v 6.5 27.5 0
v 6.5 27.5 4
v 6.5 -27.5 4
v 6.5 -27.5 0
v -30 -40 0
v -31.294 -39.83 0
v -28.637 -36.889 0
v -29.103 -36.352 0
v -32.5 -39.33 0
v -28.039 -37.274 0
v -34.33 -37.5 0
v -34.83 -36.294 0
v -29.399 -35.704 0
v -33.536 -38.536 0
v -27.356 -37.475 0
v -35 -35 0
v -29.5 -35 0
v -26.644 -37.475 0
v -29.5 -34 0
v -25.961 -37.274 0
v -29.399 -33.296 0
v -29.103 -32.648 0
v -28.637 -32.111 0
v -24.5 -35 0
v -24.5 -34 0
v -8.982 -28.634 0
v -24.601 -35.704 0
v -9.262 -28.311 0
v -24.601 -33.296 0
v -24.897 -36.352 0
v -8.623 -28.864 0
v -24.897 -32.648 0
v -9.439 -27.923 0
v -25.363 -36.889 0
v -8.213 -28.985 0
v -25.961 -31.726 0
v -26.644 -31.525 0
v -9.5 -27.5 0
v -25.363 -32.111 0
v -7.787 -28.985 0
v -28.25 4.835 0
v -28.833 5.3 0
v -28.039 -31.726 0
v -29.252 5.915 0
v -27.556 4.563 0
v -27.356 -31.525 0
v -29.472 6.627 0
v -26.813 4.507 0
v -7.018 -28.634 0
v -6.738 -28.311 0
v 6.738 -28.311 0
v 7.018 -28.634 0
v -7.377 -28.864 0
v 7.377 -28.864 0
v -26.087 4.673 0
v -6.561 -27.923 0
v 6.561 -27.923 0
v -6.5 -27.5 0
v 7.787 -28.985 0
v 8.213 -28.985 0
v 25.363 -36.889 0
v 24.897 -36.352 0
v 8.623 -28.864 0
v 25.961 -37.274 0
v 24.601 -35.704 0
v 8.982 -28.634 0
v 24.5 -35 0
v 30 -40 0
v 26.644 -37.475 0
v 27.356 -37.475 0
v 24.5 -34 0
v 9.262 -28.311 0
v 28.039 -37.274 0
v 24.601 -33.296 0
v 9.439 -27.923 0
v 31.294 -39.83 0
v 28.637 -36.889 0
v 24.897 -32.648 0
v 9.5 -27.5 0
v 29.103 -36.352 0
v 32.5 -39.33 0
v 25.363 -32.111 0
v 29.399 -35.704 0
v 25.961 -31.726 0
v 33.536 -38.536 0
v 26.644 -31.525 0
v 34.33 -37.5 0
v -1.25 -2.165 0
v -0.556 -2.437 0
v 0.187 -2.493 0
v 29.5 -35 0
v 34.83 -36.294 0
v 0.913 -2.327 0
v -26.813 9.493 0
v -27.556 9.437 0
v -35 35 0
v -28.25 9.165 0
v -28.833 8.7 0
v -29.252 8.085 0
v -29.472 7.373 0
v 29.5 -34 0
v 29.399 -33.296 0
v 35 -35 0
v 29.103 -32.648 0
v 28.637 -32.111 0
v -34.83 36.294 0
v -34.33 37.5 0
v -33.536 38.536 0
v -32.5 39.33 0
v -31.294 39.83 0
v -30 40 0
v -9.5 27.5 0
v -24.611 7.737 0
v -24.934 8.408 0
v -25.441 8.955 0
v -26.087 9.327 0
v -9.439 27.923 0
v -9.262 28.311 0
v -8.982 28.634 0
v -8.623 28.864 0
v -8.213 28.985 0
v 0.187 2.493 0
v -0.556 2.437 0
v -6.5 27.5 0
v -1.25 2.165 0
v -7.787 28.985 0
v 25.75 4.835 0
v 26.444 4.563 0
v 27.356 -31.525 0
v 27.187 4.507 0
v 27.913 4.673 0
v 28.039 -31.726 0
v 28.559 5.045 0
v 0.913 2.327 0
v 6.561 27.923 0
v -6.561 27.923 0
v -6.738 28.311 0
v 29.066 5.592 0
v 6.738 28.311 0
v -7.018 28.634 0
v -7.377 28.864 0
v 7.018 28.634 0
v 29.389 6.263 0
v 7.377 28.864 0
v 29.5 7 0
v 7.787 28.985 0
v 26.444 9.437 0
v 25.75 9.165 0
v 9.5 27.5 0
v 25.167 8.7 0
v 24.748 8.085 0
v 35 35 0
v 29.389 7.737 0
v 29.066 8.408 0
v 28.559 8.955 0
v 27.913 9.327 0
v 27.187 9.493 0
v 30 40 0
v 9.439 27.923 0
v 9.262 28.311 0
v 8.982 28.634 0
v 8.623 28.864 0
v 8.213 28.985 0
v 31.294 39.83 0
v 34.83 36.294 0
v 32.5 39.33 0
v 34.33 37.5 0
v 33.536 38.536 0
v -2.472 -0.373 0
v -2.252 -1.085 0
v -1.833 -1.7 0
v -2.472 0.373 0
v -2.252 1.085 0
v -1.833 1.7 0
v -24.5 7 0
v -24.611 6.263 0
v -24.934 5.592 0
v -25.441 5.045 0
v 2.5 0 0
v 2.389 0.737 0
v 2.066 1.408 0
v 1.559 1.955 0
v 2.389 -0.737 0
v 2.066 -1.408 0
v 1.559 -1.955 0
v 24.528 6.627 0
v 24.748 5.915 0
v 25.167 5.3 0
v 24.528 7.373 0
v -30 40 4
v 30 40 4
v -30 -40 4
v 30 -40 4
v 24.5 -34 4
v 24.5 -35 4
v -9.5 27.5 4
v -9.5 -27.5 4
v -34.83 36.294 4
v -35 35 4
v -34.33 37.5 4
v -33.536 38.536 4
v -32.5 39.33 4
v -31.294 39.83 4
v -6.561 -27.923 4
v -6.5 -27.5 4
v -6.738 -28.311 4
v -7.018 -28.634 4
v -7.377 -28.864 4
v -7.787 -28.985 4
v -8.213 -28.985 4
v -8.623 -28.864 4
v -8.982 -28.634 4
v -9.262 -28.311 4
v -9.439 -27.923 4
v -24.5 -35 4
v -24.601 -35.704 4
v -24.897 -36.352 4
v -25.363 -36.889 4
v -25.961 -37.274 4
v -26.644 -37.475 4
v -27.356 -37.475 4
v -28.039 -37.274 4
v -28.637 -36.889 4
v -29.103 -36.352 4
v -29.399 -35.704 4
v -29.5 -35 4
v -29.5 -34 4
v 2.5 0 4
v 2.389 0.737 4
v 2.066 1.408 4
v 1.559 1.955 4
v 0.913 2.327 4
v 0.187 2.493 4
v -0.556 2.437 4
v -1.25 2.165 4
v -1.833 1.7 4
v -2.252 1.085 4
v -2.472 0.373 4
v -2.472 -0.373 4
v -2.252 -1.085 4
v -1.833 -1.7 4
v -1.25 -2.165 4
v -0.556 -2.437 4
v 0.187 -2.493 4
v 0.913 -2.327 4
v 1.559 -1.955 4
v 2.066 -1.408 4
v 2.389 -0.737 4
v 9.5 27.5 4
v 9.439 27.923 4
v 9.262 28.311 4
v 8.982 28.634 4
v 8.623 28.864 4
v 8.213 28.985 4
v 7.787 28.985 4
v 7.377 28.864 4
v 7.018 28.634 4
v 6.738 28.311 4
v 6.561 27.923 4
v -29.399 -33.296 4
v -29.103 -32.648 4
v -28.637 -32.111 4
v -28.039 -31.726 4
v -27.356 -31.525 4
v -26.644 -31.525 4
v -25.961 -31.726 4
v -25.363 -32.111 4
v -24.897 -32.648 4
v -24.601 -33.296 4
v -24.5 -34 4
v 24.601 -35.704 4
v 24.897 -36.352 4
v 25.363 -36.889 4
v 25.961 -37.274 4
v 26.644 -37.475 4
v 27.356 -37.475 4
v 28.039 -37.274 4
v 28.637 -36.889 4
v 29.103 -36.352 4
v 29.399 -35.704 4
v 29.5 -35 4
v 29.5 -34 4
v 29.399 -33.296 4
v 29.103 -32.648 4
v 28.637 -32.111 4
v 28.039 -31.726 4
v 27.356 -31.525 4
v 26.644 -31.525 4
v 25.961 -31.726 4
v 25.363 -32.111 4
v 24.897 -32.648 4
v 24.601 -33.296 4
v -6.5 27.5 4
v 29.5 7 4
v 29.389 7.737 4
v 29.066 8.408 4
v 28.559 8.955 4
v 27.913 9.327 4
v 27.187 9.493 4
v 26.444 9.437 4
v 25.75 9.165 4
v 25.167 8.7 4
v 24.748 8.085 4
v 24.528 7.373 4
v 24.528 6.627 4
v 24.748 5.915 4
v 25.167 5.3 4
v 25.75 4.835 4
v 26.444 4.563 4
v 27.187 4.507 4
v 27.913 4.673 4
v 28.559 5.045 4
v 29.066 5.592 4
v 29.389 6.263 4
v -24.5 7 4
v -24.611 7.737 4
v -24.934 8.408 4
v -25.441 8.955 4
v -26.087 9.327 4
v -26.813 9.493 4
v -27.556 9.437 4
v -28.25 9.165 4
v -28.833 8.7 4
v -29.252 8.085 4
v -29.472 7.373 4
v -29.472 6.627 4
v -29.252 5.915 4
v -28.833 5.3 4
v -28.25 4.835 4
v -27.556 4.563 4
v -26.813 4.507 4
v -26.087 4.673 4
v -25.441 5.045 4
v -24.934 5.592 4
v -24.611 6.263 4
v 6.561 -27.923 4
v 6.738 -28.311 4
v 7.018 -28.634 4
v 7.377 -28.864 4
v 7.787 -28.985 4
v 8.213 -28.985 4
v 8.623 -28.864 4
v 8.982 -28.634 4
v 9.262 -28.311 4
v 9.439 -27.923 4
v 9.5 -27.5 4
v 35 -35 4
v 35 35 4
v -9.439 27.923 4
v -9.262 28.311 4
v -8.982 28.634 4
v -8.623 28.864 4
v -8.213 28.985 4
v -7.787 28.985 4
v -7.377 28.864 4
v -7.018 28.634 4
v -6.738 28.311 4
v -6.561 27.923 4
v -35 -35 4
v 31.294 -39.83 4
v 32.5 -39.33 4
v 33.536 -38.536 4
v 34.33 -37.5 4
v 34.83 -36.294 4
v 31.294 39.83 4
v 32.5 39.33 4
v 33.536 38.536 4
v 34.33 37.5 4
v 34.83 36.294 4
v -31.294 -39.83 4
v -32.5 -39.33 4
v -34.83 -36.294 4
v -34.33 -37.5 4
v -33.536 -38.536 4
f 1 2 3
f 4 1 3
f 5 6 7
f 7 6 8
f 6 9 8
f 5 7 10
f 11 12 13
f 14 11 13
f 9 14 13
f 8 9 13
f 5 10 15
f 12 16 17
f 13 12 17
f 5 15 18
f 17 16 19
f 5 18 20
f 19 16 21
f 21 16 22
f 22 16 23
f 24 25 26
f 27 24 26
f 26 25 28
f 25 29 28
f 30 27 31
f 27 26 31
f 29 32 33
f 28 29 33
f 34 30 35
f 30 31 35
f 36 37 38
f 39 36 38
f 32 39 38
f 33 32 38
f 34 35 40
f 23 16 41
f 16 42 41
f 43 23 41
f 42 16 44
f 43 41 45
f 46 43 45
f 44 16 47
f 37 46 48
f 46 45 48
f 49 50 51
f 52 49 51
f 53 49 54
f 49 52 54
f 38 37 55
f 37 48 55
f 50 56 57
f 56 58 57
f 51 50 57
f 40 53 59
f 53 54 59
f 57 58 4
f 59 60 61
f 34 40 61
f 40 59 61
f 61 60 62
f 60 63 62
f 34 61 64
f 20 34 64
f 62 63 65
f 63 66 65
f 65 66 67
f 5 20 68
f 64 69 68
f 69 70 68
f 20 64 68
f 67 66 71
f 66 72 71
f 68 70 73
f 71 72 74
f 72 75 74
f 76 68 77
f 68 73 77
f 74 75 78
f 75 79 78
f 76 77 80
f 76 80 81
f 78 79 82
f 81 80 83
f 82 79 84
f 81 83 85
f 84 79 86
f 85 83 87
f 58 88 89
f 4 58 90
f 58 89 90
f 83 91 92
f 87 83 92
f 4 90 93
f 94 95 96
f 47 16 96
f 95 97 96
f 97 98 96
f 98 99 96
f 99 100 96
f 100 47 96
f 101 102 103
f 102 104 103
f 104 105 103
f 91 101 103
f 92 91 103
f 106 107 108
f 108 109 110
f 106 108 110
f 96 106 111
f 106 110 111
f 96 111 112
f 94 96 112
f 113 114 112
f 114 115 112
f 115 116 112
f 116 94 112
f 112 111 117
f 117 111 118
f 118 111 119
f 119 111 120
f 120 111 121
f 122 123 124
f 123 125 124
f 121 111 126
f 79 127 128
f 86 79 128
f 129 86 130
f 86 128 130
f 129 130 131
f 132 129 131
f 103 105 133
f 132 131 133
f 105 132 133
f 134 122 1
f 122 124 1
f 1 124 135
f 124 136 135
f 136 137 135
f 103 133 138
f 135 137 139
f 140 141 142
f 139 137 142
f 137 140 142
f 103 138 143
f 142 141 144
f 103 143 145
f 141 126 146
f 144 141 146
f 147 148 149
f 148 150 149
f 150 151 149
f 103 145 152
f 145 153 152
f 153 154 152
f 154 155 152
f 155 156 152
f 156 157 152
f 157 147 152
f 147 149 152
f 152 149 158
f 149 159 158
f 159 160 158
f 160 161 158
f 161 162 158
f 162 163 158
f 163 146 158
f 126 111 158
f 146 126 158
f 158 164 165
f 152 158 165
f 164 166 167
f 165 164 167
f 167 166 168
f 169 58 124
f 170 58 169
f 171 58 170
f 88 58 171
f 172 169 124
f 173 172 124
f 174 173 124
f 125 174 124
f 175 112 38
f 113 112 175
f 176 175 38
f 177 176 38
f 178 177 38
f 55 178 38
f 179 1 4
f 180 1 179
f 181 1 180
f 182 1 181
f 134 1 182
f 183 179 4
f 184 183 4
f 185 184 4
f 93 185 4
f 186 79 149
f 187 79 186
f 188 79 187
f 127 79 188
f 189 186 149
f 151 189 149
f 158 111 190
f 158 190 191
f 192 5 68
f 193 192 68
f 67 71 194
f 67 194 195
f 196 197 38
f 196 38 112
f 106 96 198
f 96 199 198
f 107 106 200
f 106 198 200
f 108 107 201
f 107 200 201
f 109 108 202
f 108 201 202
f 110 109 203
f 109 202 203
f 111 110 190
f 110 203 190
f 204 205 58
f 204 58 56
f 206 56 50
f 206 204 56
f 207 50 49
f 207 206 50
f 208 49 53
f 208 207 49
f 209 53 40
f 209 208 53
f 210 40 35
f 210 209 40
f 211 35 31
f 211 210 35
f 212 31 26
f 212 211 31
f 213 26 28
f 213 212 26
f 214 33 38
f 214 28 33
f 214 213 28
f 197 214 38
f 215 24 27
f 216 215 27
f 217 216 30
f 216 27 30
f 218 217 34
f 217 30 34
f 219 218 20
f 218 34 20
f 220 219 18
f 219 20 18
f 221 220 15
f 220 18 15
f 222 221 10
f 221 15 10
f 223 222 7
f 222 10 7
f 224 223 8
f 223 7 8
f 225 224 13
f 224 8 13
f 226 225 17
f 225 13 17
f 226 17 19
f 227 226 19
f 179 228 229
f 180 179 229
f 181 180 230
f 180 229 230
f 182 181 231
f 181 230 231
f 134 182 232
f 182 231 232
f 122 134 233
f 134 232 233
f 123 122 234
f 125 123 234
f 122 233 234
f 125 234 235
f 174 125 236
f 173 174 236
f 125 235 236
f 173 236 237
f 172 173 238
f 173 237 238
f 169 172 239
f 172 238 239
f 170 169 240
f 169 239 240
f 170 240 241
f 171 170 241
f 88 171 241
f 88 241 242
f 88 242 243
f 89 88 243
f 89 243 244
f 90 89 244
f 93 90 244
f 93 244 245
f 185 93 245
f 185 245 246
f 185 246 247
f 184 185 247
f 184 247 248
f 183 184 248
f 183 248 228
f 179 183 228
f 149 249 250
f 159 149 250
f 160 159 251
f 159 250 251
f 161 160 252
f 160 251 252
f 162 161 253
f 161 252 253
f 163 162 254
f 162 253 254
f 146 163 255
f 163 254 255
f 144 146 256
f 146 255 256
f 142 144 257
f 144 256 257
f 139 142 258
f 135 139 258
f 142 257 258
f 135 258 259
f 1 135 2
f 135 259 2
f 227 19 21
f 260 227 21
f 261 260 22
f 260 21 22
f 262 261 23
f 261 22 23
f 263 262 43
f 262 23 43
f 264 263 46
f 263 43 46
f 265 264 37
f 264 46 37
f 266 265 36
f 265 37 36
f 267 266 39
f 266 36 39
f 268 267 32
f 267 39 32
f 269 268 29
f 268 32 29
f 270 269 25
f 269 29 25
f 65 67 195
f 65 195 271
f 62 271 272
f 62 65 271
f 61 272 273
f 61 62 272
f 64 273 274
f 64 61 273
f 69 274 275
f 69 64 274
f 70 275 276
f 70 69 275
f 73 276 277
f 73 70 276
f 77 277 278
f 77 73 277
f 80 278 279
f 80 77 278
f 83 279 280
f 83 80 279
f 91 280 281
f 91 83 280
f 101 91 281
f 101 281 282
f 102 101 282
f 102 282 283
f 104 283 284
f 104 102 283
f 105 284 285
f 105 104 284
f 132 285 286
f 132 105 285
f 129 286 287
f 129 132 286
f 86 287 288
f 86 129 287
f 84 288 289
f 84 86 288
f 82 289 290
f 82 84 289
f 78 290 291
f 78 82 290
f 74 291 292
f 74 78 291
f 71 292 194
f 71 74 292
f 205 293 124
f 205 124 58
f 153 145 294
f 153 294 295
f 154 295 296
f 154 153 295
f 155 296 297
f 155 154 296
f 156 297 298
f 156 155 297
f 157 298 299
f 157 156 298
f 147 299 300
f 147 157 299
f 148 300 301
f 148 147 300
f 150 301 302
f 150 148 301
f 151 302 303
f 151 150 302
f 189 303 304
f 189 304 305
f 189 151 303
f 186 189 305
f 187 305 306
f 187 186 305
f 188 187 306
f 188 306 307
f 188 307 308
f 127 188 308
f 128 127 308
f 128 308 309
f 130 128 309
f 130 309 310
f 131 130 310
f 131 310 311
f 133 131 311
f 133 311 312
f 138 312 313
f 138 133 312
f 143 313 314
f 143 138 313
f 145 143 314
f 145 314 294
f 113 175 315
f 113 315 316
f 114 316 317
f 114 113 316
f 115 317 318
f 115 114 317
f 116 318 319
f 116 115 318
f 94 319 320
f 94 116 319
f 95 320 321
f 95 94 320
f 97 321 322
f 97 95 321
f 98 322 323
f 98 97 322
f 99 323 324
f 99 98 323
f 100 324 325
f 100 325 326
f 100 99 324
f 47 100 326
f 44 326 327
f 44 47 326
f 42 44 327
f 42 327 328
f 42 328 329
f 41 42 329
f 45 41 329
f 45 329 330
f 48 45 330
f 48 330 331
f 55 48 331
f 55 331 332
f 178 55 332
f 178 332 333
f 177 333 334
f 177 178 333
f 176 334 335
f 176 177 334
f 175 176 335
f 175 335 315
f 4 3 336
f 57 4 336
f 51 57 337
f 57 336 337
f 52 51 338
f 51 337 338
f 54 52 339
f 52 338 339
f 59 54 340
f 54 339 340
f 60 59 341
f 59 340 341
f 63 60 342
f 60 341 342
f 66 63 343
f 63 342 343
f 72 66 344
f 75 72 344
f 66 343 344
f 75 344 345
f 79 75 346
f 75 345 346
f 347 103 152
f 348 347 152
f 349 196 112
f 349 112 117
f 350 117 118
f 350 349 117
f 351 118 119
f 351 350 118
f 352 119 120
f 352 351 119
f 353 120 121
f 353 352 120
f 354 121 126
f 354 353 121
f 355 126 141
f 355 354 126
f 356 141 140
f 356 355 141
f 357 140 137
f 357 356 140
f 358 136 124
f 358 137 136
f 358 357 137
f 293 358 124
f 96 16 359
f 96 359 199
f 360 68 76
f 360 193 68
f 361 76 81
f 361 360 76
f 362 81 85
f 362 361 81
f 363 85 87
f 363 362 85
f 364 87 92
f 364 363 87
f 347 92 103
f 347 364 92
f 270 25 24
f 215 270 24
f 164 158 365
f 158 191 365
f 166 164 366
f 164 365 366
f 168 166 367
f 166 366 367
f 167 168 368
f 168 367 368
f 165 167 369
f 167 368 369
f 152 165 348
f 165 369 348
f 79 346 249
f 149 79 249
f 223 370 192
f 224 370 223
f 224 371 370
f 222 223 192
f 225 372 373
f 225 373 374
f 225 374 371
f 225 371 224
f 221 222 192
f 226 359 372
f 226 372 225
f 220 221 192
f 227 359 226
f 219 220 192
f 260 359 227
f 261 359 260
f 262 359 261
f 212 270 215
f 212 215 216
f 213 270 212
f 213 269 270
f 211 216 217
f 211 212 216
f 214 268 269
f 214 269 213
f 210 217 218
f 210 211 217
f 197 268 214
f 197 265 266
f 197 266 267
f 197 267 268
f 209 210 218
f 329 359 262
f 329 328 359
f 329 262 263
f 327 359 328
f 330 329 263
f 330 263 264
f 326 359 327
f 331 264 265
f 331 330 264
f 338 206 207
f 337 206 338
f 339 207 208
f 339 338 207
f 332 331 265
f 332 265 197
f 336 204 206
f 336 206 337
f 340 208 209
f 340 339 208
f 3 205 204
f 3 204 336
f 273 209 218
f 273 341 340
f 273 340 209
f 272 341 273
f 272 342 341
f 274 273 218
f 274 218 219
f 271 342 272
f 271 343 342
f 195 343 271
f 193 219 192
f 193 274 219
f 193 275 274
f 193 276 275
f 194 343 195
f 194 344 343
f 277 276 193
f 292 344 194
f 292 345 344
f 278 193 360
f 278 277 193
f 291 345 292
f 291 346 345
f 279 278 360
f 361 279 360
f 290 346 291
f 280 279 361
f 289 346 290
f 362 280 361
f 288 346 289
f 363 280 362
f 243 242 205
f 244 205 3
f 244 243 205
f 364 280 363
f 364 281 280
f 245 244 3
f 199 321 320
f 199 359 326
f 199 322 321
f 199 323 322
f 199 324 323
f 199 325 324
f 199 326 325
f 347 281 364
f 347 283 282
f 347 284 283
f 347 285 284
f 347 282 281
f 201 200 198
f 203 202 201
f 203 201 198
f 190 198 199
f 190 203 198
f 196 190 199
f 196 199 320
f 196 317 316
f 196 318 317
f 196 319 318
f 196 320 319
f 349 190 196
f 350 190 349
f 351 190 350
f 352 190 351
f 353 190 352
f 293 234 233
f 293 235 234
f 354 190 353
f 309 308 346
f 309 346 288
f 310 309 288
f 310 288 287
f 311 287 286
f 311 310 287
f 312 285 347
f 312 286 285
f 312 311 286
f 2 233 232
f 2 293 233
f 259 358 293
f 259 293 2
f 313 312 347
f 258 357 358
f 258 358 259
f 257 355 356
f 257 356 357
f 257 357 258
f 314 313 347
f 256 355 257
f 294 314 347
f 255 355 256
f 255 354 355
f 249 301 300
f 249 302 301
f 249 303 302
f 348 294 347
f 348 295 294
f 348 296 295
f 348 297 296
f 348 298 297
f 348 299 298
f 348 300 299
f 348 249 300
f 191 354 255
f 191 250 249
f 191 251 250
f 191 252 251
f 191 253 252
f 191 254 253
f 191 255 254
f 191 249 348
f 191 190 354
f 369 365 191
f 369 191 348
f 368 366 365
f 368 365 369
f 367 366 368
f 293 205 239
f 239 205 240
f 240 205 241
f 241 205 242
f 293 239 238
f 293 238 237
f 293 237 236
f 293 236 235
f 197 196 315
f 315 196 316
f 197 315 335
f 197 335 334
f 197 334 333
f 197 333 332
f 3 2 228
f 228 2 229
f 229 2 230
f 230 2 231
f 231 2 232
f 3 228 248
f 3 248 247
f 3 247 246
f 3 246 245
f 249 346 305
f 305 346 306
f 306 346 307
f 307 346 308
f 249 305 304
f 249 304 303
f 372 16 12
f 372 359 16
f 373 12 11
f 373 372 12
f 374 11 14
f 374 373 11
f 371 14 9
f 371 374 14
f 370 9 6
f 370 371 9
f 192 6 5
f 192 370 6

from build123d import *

# Parameters (mm, degrees)
SKETCH4_W           = 70
SKETCH4_H           = 80
SKETCH4_R           = 2.5
BOSS_EXTRUDE2_DEPTH = 4
FILLET1_R           = 5
SKETCH6_R           = 2.5
CUT_EXTRUDE1_DEPTH  = 5


with BuildPart() as part:
    # Sketch4 → Boss-Extrude2 (new body)
    with BuildSketch(Plane.XY):
        Rectangle(SKETCH4_W, SKETCH4_H)
        with Locations((-27, 7)):
            Circle(SKETCH4_R, mode=Mode.SUBTRACT)
        with Locations((27, 7)):
            Circle(SKETCH4_R, mode=Mode.SUBTRACT)
        with BuildLine():
            Line((-24.5, -34), (-24.5, -35))
            ThreePointArc((-24.5, -35), (-27, -37.5), (-29.5, -35))
            Line((-29.5, -35), (-29.5, -34))
            ThreePointArc((-29.5, -34), (-27, -31.5), (-24.5, -34))
        make_face(mode=Mode.SUBTRACT)
        with BuildLine():
            Line((24.5, -34), (24.5, -35))
            ThreePointArc((24.5, -35), (27, -37.5), (29.5, -35))
            Line((29.5, -35), (29.5, -34))
            ThreePointArc((29.5, -34), (27, -31.5), (24.5, -34))
        make_face(mode=Mode.SUBTRACT)
    extrude(amount=BOSS_EXTRUDE2_DEPTH)

    # Fillet1
    fillet1_edges = [part.edges().sort_by_distance(p)[0] for p in [
        (35, -40, 2),
        (-35, -40, 2),
        (-35, 40, 2),
        (35, 40, 2),
    ]]
    fillet(fillet1_edges, radius=FILLET1_R)

    # Sketch6 → Cut-Extrude1 (cut, through all)
    with BuildSketch(Plane.XY.offset(4)):
        Circle(SKETCH6_R)
        with BuildLine():
            Line((-6.5, 27.5), (-6.5, -27.5))
            ThreePointArc((-6.5, -27.5), (-8, -29), (-9.5, -27.5))
            Line((-9.5, -27.5), (-9.5, 27.5))
            ThreePointArc((-9.5, 27.5), (-8, 29), (-6.5, 27.5))
        make_face()
        with BuildLine():
            Line((6.5, 27.5), (6.5, -27.5))
            ThreePointArc((6.5, -27.5), (8, -29), (9.5, -27.5))
            Line((9.5, -27.5), (9.5, 27.5))
            ThreePointArc((9.5, 27.5), (8, 29), (6.5, 27.5))
        make_face()
    extrude(amount=-CUT_EXTRUDE1_DEPTH, mode=Mode.SUBTRACT)


solid = part.part
